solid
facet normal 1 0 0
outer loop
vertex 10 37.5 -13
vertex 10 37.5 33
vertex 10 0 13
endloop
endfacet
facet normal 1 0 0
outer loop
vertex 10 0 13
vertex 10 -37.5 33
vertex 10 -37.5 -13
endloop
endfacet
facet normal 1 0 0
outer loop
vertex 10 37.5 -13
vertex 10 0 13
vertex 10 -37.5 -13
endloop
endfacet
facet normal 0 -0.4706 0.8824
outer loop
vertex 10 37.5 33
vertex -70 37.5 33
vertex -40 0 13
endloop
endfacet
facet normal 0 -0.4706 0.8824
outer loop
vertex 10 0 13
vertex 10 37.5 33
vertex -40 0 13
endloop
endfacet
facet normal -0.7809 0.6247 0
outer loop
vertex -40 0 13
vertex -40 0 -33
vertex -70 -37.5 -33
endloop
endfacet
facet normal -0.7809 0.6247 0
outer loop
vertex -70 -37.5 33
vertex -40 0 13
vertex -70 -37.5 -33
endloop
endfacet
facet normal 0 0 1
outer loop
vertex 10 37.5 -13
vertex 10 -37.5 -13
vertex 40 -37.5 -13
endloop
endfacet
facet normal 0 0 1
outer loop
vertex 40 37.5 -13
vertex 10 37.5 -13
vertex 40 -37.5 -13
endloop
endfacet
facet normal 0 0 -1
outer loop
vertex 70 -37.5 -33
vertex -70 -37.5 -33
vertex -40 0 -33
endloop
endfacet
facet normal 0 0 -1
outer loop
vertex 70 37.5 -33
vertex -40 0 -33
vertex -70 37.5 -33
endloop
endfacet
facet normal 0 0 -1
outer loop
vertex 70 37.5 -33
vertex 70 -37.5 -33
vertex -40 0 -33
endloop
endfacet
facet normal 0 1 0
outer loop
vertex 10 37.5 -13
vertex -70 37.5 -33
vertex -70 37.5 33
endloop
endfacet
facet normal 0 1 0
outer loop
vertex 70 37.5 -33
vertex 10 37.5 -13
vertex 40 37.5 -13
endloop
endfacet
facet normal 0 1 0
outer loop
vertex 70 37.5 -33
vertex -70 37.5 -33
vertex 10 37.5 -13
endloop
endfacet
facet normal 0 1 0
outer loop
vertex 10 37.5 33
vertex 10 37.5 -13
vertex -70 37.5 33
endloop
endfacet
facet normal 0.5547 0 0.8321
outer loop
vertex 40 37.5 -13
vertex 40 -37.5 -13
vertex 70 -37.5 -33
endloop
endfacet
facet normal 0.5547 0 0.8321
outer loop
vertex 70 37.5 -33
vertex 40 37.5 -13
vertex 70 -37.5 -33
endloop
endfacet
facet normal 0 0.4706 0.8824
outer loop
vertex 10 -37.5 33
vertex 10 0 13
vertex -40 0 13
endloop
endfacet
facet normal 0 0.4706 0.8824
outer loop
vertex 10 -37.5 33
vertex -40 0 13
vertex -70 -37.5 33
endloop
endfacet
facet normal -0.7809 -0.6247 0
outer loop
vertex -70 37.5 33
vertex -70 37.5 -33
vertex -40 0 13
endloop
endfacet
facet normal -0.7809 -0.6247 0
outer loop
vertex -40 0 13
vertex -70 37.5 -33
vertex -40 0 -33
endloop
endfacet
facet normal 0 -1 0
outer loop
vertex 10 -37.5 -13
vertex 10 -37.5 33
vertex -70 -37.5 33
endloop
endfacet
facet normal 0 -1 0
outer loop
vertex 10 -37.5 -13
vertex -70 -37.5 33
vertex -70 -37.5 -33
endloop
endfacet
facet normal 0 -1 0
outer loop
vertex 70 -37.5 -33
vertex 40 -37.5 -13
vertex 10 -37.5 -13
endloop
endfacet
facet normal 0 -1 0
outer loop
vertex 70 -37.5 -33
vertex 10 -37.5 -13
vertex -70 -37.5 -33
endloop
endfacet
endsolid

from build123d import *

# Parameters (mm, degrees)
F1_DEPTH = 70
F3_DEPTH = 75.001
F5_DEPTH = 66.001


with BuildPart() as f1:
    # F0 (on Right) → F1 (new body, symmetric)
    with BuildSketch(Plane.YZ):
        Polygon((-37.5, -33), (37.5, -33), (37.5, 33), (0, 13), (-37.5, 33), align=None)
    extrude(amount=F1_DEPTH, both=True)

    # F2 (on face) → F3 (cut, through all)
    with BuildSketch(Plane.XZ.offset(37.5)):
        Polygon((10, -13), (40, -13), (70, -33), (70, 33), (10, 33), align=None)
    extrude(amount=-F3_DEPTH, mode=Mode.SUBTRACT)

    # F4 (on face) → F5 (cut, through all)
    with BuildSketch(Plane(origin=(0, 0, -33), x_dir=(1, 0, 0), z_dir=(0, 0, -1))):
        Polygon((-70, -37.5), (-40, 0), (-70, 37.5), align=None)
    extrude(amount=-F5_DEPTH, mode=Mode.SUBTRACT)


solid = f1.part
